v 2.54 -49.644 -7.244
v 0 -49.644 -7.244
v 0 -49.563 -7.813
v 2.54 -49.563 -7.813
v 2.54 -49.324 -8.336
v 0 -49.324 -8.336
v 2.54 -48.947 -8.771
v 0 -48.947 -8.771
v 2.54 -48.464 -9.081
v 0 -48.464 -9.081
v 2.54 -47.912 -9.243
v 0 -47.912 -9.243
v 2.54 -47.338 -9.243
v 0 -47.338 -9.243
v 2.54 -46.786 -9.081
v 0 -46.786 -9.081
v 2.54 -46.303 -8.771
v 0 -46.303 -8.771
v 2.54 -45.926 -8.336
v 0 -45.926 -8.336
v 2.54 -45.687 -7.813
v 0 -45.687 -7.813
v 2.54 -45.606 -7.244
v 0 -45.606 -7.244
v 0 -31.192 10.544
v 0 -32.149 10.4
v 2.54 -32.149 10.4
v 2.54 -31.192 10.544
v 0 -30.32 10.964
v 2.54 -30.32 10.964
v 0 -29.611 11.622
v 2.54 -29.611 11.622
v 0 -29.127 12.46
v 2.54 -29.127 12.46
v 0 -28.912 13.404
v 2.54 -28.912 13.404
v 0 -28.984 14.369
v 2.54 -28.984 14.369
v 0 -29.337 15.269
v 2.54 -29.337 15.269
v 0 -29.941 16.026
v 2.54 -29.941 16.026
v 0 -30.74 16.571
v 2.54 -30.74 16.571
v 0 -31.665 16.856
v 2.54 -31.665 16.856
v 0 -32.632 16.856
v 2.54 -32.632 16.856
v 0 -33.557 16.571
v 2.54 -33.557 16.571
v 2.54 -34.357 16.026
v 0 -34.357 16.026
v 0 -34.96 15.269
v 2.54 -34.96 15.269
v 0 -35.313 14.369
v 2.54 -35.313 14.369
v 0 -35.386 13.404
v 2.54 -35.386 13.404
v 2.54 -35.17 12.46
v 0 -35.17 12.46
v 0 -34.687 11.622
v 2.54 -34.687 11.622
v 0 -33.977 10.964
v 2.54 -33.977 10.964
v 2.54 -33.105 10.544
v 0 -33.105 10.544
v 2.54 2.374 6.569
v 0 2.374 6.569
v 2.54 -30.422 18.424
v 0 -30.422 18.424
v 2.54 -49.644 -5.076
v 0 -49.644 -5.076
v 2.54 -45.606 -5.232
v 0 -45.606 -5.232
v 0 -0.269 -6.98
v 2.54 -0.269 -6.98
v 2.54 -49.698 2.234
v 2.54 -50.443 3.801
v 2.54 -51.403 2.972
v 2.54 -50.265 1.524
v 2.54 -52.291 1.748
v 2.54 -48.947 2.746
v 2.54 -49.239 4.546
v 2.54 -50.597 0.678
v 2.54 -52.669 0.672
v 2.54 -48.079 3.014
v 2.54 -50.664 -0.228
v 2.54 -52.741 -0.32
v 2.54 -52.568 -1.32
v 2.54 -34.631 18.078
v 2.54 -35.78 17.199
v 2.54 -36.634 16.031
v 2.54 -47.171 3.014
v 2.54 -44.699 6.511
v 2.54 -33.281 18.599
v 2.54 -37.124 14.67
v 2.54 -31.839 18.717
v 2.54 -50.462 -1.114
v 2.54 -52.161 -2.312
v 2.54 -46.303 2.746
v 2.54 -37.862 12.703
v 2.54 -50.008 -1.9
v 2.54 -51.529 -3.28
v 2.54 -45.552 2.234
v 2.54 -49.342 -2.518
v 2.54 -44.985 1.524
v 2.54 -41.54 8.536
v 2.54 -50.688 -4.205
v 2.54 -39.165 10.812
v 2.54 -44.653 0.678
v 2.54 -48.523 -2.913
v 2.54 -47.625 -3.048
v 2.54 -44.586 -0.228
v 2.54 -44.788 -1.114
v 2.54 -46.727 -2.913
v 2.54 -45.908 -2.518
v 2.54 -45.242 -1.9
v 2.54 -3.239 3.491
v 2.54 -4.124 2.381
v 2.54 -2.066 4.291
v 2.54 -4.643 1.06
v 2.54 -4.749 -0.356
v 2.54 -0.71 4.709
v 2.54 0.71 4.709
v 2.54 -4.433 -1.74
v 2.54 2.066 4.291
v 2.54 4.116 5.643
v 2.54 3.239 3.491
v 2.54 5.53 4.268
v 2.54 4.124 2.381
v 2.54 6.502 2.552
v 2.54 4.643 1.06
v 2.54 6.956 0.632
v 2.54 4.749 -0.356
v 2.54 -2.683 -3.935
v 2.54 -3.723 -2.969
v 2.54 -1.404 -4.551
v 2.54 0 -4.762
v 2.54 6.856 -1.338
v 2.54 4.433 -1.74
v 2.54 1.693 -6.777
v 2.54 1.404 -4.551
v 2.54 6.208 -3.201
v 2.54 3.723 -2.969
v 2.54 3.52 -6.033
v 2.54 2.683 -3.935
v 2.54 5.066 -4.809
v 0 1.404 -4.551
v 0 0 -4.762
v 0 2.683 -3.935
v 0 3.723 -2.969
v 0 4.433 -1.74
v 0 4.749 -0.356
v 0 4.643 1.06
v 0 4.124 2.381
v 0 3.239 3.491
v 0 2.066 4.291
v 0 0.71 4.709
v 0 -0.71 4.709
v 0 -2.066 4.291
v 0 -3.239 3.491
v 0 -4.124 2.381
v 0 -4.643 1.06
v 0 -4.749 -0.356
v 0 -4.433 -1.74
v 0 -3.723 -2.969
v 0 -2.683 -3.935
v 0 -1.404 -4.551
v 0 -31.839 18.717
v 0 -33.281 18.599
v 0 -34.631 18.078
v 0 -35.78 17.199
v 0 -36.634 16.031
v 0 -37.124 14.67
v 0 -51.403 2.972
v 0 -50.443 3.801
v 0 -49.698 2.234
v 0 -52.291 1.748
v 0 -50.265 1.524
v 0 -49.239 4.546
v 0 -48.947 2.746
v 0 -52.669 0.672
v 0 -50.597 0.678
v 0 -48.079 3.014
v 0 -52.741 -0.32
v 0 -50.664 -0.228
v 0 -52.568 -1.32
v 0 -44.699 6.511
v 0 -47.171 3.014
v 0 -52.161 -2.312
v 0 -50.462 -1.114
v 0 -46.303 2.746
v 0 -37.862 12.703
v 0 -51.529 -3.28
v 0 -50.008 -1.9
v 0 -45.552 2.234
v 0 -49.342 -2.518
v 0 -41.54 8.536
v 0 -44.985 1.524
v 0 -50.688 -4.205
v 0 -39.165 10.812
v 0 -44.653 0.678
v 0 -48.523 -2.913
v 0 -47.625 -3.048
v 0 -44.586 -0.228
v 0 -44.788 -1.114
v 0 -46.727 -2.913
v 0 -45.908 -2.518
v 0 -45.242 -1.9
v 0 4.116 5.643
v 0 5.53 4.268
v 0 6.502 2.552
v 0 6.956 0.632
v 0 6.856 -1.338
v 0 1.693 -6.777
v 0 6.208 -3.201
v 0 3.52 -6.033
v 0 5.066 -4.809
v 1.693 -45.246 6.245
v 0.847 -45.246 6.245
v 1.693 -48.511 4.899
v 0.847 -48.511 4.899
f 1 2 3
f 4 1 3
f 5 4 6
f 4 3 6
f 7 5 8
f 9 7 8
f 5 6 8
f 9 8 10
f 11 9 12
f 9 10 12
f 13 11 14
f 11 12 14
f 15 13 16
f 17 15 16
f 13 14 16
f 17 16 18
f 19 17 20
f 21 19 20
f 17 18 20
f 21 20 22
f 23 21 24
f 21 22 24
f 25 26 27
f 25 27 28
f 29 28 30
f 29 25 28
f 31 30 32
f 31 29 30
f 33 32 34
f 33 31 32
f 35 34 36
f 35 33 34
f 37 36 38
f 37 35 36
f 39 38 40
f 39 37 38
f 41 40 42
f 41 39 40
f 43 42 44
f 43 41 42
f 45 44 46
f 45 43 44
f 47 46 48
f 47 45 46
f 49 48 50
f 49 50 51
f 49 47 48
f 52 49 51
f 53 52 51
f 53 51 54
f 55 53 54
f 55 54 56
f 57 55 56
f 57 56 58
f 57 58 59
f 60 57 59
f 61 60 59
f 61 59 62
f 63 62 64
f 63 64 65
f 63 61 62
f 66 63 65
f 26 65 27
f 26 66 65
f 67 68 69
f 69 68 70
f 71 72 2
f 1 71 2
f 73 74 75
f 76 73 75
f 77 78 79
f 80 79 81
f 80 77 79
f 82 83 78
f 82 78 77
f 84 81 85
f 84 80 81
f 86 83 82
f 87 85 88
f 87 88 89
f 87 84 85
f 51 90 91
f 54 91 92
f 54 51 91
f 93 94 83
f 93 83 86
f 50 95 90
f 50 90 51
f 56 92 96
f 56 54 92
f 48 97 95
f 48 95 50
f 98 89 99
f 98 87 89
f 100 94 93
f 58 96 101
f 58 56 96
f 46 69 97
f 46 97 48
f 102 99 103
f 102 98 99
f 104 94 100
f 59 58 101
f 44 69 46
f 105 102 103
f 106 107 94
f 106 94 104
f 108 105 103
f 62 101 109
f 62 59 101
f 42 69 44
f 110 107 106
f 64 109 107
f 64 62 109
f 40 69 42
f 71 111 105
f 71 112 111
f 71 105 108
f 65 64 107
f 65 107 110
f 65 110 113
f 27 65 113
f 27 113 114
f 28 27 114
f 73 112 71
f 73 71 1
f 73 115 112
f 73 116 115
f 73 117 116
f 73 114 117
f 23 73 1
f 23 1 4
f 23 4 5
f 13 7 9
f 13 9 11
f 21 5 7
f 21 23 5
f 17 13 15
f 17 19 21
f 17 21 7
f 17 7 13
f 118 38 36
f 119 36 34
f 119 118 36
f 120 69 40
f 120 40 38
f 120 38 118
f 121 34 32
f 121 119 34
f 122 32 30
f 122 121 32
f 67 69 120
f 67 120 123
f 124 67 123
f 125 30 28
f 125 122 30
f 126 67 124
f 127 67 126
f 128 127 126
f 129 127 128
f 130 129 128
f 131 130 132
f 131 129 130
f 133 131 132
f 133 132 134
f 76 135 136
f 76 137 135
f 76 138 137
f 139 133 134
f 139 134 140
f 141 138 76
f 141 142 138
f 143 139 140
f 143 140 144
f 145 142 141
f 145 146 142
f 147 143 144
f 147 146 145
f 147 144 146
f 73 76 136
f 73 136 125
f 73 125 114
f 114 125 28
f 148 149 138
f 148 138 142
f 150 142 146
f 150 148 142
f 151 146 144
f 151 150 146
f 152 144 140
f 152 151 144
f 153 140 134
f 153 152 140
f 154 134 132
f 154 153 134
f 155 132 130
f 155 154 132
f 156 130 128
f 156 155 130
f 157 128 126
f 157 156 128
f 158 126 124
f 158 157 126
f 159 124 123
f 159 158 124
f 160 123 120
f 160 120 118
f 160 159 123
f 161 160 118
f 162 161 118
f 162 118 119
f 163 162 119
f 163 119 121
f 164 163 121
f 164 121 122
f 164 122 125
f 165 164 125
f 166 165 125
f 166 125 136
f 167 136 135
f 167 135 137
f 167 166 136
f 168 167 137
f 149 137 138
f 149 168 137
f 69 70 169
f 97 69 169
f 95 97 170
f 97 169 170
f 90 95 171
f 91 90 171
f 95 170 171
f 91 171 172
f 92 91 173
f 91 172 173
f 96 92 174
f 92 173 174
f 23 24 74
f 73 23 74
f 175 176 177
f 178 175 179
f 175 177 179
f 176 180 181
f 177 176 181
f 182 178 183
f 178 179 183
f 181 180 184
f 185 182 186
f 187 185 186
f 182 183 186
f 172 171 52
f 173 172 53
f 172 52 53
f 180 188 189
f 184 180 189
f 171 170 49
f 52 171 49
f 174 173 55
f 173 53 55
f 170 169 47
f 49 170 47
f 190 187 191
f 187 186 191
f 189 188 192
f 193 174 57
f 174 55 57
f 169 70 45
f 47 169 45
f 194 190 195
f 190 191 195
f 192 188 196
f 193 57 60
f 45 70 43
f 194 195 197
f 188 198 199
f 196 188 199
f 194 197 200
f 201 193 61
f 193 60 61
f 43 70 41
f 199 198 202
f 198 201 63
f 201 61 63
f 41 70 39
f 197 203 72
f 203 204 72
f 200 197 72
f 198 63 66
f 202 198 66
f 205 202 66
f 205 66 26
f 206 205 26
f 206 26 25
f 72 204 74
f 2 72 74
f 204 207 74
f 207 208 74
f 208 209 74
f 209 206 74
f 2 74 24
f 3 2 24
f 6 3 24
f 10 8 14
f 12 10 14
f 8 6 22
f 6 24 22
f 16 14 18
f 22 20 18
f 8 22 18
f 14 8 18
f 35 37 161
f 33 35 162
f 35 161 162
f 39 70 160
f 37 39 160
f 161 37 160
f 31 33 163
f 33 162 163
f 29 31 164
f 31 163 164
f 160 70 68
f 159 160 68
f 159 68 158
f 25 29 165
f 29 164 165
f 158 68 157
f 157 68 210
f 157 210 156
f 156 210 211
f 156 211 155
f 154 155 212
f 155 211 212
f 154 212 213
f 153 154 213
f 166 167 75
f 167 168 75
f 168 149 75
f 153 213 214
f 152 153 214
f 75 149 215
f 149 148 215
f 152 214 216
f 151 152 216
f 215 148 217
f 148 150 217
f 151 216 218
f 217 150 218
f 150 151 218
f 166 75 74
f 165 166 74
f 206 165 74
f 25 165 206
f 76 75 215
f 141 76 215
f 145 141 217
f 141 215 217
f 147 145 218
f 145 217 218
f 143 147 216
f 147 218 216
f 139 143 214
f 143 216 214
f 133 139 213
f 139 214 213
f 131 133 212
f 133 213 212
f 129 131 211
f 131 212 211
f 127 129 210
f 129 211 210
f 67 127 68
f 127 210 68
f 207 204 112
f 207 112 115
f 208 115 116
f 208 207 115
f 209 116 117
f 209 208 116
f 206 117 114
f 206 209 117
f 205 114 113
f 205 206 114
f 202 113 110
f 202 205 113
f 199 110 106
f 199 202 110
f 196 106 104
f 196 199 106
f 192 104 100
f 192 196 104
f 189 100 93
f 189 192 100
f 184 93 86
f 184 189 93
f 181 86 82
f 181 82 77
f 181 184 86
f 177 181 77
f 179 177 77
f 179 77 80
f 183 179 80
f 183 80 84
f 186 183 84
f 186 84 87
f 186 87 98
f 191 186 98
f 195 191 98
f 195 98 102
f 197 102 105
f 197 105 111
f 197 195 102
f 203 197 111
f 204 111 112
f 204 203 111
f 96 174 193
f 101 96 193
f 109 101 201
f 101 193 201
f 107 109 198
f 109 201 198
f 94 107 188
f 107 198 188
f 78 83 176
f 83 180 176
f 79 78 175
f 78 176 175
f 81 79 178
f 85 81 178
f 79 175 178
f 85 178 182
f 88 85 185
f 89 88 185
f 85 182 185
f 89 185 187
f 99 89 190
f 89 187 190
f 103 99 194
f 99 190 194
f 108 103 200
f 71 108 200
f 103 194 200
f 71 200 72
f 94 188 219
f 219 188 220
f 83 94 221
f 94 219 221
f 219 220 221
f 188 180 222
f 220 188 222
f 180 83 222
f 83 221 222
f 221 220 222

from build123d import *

# Parameters (mm, degrees)
SKETCH1_R           = 4.7625
SKETCH1_R_2         = 3.24612
SKETCH1_R_3         = 3.048
BOSS_EXTRUDE1_DEPTH = 2.54


with BuildPart() as part:
    # Sketch1 → Boss-Extrude1 (new body)
    with BuildSketch(Plane(origin=(0, 0, 0), x_dir=(0, 0, -1), z_dir=(1, 0, 0))):
        with BuildLine():
            Line((-6.569022954, 2.374481507), (-18.423755902, -30.421736365))
            ThreePointArc((-18.423755902, -30.421736365), (-18.07845445, -34.631024194), (-14.669645238, -37.124487022))
            add(Edge.make_bspline(
                [(-14.669645238, -37.124487022), (-11.315746, -37.814267622), (-6.920874402, -42.715545966), (-3.149468295, -54.175396606), (2.01655163, -53.801646181), (5.076228822, -49.6443)],
                knots=[0, 0, 0, 0, 0.321172829, 0.421172829, 1, 1, 1, 1], degree=3))
            Line((5.076228822, -49.6443), (7.24445656, -49.6443))
            ThreePointArc((7.24445656, -49.6443), (9.26375656, -47.625), (7.24445656, -45.6057))
            Line((7.24445656, -45.6057), (5.231930896, -45.6057))
            Line((5.231930896, -45.6057), (6.97981463, -0.269096126))
            ThreePointArc((6.97981463, -0.269096126), (1.337652095, 6.855721105), (-6.569022954, 2.374481507))
        make_face()
        Circle(SKETCH1_R, mode=Mode.SUBTRACT)
        with Locations((-13.646284662, -32.148632007)):
            Circle(SKETCH1_R_2, mode=Mode.SUBTRACT)
        with Locations((0, -47.625)):
            Circle(SKETCH1_R_3, mode=Mode.SUBTRACT)
    extrude(amount=BOSS_EXTRUDE1_DEPTH)


solid = part.part
